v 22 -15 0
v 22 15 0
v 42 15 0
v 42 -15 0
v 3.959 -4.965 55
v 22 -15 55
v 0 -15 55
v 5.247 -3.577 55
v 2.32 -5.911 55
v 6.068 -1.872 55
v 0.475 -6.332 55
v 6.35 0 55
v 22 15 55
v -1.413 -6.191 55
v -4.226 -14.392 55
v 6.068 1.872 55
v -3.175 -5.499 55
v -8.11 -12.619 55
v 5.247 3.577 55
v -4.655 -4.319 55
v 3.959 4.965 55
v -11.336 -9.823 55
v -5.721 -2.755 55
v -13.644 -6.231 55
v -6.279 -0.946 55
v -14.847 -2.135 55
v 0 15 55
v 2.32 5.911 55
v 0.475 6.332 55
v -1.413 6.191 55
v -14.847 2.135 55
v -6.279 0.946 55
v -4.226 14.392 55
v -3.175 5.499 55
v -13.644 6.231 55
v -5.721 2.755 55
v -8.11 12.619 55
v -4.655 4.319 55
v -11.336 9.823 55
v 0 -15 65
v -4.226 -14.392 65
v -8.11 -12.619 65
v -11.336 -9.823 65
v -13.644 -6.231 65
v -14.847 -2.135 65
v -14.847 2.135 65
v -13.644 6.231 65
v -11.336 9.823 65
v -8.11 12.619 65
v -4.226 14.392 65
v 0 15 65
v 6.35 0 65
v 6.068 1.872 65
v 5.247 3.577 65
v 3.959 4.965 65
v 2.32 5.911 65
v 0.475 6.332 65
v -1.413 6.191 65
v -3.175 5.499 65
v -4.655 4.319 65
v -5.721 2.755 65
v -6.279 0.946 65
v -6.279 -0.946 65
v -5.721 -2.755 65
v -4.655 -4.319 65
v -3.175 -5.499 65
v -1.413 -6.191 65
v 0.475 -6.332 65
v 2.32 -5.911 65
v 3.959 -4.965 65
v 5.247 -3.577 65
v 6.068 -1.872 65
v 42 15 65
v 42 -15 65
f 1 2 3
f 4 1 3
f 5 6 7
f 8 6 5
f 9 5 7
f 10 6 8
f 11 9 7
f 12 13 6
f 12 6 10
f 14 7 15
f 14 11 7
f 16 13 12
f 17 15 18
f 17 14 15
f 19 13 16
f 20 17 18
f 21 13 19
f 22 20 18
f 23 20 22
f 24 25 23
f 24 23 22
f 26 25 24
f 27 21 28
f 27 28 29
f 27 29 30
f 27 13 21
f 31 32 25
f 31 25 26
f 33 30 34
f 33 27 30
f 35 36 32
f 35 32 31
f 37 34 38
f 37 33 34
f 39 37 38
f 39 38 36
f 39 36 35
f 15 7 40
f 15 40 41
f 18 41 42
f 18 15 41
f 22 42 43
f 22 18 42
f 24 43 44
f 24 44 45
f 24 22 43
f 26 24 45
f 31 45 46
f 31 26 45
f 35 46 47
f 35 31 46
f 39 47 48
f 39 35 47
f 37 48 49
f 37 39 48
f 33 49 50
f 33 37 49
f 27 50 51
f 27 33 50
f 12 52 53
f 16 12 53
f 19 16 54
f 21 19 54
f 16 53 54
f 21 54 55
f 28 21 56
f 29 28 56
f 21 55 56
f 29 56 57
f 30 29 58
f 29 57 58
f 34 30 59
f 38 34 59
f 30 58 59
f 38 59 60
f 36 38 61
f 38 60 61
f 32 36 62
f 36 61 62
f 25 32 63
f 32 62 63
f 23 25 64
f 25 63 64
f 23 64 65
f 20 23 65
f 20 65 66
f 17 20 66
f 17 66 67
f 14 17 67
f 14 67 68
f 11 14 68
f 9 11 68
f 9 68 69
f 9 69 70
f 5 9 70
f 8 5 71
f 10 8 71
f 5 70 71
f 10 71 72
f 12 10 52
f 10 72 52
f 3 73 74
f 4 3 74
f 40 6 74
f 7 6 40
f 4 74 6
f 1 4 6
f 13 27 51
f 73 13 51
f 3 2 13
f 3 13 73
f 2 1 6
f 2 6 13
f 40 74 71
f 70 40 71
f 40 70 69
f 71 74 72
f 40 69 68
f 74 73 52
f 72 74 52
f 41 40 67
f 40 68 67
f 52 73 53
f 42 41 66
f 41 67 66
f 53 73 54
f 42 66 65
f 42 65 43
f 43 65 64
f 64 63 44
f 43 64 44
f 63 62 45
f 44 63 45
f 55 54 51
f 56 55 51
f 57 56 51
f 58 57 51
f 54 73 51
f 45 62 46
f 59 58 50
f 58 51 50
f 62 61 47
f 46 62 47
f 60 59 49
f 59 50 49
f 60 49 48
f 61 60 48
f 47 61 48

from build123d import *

# Parameters (mm, degrees)
SKETCH1_W           = 20
SKETCH1_H           = 30
BOSS_EXTRUDE1_DEPTH = 55
BOSS_EXTRUDE2_DEPTH = 10
SKETCH3_R           = 6.35
CUT_EXTRUDE1_DEPTH  = 10


with BuildPart() as part:
    # Sketch1 → Boss-Extrude1 (new body)
    with BuildSketch(Plane.XY):
        with Locations((32, 0)):
            Rectangle(SKETCH1_W, SKETCH1_H)
    extrude(amount=BOSS_EXTRUDE1_DEPTH)

    # Sketch2 → Boss-Extrude2 (add)
    with BuildSketch(Plane.XY.offset(55)):
        with BuildLine():
            Line((42, 15), (42, -15))
            Line((42, -15), (0, -15))
            ThreePointArc((0, -15), (-15, 0), (0, 15))
            Line((0, 15), (42, 15))
        make_face()
    extrude(amount=BOSS_EXTRUDE2_DEPTH)

    # Sketch3 → Cut-Extrude1 (cut)
    with BuildSketch(Plane.XY.offset(65)):
        Circle(SKETCH3_R)
    extrude(amount=-CUT_EXTRUDE1_DEPTH, mode=Mode.SUBTRACT)


solid = part.part
